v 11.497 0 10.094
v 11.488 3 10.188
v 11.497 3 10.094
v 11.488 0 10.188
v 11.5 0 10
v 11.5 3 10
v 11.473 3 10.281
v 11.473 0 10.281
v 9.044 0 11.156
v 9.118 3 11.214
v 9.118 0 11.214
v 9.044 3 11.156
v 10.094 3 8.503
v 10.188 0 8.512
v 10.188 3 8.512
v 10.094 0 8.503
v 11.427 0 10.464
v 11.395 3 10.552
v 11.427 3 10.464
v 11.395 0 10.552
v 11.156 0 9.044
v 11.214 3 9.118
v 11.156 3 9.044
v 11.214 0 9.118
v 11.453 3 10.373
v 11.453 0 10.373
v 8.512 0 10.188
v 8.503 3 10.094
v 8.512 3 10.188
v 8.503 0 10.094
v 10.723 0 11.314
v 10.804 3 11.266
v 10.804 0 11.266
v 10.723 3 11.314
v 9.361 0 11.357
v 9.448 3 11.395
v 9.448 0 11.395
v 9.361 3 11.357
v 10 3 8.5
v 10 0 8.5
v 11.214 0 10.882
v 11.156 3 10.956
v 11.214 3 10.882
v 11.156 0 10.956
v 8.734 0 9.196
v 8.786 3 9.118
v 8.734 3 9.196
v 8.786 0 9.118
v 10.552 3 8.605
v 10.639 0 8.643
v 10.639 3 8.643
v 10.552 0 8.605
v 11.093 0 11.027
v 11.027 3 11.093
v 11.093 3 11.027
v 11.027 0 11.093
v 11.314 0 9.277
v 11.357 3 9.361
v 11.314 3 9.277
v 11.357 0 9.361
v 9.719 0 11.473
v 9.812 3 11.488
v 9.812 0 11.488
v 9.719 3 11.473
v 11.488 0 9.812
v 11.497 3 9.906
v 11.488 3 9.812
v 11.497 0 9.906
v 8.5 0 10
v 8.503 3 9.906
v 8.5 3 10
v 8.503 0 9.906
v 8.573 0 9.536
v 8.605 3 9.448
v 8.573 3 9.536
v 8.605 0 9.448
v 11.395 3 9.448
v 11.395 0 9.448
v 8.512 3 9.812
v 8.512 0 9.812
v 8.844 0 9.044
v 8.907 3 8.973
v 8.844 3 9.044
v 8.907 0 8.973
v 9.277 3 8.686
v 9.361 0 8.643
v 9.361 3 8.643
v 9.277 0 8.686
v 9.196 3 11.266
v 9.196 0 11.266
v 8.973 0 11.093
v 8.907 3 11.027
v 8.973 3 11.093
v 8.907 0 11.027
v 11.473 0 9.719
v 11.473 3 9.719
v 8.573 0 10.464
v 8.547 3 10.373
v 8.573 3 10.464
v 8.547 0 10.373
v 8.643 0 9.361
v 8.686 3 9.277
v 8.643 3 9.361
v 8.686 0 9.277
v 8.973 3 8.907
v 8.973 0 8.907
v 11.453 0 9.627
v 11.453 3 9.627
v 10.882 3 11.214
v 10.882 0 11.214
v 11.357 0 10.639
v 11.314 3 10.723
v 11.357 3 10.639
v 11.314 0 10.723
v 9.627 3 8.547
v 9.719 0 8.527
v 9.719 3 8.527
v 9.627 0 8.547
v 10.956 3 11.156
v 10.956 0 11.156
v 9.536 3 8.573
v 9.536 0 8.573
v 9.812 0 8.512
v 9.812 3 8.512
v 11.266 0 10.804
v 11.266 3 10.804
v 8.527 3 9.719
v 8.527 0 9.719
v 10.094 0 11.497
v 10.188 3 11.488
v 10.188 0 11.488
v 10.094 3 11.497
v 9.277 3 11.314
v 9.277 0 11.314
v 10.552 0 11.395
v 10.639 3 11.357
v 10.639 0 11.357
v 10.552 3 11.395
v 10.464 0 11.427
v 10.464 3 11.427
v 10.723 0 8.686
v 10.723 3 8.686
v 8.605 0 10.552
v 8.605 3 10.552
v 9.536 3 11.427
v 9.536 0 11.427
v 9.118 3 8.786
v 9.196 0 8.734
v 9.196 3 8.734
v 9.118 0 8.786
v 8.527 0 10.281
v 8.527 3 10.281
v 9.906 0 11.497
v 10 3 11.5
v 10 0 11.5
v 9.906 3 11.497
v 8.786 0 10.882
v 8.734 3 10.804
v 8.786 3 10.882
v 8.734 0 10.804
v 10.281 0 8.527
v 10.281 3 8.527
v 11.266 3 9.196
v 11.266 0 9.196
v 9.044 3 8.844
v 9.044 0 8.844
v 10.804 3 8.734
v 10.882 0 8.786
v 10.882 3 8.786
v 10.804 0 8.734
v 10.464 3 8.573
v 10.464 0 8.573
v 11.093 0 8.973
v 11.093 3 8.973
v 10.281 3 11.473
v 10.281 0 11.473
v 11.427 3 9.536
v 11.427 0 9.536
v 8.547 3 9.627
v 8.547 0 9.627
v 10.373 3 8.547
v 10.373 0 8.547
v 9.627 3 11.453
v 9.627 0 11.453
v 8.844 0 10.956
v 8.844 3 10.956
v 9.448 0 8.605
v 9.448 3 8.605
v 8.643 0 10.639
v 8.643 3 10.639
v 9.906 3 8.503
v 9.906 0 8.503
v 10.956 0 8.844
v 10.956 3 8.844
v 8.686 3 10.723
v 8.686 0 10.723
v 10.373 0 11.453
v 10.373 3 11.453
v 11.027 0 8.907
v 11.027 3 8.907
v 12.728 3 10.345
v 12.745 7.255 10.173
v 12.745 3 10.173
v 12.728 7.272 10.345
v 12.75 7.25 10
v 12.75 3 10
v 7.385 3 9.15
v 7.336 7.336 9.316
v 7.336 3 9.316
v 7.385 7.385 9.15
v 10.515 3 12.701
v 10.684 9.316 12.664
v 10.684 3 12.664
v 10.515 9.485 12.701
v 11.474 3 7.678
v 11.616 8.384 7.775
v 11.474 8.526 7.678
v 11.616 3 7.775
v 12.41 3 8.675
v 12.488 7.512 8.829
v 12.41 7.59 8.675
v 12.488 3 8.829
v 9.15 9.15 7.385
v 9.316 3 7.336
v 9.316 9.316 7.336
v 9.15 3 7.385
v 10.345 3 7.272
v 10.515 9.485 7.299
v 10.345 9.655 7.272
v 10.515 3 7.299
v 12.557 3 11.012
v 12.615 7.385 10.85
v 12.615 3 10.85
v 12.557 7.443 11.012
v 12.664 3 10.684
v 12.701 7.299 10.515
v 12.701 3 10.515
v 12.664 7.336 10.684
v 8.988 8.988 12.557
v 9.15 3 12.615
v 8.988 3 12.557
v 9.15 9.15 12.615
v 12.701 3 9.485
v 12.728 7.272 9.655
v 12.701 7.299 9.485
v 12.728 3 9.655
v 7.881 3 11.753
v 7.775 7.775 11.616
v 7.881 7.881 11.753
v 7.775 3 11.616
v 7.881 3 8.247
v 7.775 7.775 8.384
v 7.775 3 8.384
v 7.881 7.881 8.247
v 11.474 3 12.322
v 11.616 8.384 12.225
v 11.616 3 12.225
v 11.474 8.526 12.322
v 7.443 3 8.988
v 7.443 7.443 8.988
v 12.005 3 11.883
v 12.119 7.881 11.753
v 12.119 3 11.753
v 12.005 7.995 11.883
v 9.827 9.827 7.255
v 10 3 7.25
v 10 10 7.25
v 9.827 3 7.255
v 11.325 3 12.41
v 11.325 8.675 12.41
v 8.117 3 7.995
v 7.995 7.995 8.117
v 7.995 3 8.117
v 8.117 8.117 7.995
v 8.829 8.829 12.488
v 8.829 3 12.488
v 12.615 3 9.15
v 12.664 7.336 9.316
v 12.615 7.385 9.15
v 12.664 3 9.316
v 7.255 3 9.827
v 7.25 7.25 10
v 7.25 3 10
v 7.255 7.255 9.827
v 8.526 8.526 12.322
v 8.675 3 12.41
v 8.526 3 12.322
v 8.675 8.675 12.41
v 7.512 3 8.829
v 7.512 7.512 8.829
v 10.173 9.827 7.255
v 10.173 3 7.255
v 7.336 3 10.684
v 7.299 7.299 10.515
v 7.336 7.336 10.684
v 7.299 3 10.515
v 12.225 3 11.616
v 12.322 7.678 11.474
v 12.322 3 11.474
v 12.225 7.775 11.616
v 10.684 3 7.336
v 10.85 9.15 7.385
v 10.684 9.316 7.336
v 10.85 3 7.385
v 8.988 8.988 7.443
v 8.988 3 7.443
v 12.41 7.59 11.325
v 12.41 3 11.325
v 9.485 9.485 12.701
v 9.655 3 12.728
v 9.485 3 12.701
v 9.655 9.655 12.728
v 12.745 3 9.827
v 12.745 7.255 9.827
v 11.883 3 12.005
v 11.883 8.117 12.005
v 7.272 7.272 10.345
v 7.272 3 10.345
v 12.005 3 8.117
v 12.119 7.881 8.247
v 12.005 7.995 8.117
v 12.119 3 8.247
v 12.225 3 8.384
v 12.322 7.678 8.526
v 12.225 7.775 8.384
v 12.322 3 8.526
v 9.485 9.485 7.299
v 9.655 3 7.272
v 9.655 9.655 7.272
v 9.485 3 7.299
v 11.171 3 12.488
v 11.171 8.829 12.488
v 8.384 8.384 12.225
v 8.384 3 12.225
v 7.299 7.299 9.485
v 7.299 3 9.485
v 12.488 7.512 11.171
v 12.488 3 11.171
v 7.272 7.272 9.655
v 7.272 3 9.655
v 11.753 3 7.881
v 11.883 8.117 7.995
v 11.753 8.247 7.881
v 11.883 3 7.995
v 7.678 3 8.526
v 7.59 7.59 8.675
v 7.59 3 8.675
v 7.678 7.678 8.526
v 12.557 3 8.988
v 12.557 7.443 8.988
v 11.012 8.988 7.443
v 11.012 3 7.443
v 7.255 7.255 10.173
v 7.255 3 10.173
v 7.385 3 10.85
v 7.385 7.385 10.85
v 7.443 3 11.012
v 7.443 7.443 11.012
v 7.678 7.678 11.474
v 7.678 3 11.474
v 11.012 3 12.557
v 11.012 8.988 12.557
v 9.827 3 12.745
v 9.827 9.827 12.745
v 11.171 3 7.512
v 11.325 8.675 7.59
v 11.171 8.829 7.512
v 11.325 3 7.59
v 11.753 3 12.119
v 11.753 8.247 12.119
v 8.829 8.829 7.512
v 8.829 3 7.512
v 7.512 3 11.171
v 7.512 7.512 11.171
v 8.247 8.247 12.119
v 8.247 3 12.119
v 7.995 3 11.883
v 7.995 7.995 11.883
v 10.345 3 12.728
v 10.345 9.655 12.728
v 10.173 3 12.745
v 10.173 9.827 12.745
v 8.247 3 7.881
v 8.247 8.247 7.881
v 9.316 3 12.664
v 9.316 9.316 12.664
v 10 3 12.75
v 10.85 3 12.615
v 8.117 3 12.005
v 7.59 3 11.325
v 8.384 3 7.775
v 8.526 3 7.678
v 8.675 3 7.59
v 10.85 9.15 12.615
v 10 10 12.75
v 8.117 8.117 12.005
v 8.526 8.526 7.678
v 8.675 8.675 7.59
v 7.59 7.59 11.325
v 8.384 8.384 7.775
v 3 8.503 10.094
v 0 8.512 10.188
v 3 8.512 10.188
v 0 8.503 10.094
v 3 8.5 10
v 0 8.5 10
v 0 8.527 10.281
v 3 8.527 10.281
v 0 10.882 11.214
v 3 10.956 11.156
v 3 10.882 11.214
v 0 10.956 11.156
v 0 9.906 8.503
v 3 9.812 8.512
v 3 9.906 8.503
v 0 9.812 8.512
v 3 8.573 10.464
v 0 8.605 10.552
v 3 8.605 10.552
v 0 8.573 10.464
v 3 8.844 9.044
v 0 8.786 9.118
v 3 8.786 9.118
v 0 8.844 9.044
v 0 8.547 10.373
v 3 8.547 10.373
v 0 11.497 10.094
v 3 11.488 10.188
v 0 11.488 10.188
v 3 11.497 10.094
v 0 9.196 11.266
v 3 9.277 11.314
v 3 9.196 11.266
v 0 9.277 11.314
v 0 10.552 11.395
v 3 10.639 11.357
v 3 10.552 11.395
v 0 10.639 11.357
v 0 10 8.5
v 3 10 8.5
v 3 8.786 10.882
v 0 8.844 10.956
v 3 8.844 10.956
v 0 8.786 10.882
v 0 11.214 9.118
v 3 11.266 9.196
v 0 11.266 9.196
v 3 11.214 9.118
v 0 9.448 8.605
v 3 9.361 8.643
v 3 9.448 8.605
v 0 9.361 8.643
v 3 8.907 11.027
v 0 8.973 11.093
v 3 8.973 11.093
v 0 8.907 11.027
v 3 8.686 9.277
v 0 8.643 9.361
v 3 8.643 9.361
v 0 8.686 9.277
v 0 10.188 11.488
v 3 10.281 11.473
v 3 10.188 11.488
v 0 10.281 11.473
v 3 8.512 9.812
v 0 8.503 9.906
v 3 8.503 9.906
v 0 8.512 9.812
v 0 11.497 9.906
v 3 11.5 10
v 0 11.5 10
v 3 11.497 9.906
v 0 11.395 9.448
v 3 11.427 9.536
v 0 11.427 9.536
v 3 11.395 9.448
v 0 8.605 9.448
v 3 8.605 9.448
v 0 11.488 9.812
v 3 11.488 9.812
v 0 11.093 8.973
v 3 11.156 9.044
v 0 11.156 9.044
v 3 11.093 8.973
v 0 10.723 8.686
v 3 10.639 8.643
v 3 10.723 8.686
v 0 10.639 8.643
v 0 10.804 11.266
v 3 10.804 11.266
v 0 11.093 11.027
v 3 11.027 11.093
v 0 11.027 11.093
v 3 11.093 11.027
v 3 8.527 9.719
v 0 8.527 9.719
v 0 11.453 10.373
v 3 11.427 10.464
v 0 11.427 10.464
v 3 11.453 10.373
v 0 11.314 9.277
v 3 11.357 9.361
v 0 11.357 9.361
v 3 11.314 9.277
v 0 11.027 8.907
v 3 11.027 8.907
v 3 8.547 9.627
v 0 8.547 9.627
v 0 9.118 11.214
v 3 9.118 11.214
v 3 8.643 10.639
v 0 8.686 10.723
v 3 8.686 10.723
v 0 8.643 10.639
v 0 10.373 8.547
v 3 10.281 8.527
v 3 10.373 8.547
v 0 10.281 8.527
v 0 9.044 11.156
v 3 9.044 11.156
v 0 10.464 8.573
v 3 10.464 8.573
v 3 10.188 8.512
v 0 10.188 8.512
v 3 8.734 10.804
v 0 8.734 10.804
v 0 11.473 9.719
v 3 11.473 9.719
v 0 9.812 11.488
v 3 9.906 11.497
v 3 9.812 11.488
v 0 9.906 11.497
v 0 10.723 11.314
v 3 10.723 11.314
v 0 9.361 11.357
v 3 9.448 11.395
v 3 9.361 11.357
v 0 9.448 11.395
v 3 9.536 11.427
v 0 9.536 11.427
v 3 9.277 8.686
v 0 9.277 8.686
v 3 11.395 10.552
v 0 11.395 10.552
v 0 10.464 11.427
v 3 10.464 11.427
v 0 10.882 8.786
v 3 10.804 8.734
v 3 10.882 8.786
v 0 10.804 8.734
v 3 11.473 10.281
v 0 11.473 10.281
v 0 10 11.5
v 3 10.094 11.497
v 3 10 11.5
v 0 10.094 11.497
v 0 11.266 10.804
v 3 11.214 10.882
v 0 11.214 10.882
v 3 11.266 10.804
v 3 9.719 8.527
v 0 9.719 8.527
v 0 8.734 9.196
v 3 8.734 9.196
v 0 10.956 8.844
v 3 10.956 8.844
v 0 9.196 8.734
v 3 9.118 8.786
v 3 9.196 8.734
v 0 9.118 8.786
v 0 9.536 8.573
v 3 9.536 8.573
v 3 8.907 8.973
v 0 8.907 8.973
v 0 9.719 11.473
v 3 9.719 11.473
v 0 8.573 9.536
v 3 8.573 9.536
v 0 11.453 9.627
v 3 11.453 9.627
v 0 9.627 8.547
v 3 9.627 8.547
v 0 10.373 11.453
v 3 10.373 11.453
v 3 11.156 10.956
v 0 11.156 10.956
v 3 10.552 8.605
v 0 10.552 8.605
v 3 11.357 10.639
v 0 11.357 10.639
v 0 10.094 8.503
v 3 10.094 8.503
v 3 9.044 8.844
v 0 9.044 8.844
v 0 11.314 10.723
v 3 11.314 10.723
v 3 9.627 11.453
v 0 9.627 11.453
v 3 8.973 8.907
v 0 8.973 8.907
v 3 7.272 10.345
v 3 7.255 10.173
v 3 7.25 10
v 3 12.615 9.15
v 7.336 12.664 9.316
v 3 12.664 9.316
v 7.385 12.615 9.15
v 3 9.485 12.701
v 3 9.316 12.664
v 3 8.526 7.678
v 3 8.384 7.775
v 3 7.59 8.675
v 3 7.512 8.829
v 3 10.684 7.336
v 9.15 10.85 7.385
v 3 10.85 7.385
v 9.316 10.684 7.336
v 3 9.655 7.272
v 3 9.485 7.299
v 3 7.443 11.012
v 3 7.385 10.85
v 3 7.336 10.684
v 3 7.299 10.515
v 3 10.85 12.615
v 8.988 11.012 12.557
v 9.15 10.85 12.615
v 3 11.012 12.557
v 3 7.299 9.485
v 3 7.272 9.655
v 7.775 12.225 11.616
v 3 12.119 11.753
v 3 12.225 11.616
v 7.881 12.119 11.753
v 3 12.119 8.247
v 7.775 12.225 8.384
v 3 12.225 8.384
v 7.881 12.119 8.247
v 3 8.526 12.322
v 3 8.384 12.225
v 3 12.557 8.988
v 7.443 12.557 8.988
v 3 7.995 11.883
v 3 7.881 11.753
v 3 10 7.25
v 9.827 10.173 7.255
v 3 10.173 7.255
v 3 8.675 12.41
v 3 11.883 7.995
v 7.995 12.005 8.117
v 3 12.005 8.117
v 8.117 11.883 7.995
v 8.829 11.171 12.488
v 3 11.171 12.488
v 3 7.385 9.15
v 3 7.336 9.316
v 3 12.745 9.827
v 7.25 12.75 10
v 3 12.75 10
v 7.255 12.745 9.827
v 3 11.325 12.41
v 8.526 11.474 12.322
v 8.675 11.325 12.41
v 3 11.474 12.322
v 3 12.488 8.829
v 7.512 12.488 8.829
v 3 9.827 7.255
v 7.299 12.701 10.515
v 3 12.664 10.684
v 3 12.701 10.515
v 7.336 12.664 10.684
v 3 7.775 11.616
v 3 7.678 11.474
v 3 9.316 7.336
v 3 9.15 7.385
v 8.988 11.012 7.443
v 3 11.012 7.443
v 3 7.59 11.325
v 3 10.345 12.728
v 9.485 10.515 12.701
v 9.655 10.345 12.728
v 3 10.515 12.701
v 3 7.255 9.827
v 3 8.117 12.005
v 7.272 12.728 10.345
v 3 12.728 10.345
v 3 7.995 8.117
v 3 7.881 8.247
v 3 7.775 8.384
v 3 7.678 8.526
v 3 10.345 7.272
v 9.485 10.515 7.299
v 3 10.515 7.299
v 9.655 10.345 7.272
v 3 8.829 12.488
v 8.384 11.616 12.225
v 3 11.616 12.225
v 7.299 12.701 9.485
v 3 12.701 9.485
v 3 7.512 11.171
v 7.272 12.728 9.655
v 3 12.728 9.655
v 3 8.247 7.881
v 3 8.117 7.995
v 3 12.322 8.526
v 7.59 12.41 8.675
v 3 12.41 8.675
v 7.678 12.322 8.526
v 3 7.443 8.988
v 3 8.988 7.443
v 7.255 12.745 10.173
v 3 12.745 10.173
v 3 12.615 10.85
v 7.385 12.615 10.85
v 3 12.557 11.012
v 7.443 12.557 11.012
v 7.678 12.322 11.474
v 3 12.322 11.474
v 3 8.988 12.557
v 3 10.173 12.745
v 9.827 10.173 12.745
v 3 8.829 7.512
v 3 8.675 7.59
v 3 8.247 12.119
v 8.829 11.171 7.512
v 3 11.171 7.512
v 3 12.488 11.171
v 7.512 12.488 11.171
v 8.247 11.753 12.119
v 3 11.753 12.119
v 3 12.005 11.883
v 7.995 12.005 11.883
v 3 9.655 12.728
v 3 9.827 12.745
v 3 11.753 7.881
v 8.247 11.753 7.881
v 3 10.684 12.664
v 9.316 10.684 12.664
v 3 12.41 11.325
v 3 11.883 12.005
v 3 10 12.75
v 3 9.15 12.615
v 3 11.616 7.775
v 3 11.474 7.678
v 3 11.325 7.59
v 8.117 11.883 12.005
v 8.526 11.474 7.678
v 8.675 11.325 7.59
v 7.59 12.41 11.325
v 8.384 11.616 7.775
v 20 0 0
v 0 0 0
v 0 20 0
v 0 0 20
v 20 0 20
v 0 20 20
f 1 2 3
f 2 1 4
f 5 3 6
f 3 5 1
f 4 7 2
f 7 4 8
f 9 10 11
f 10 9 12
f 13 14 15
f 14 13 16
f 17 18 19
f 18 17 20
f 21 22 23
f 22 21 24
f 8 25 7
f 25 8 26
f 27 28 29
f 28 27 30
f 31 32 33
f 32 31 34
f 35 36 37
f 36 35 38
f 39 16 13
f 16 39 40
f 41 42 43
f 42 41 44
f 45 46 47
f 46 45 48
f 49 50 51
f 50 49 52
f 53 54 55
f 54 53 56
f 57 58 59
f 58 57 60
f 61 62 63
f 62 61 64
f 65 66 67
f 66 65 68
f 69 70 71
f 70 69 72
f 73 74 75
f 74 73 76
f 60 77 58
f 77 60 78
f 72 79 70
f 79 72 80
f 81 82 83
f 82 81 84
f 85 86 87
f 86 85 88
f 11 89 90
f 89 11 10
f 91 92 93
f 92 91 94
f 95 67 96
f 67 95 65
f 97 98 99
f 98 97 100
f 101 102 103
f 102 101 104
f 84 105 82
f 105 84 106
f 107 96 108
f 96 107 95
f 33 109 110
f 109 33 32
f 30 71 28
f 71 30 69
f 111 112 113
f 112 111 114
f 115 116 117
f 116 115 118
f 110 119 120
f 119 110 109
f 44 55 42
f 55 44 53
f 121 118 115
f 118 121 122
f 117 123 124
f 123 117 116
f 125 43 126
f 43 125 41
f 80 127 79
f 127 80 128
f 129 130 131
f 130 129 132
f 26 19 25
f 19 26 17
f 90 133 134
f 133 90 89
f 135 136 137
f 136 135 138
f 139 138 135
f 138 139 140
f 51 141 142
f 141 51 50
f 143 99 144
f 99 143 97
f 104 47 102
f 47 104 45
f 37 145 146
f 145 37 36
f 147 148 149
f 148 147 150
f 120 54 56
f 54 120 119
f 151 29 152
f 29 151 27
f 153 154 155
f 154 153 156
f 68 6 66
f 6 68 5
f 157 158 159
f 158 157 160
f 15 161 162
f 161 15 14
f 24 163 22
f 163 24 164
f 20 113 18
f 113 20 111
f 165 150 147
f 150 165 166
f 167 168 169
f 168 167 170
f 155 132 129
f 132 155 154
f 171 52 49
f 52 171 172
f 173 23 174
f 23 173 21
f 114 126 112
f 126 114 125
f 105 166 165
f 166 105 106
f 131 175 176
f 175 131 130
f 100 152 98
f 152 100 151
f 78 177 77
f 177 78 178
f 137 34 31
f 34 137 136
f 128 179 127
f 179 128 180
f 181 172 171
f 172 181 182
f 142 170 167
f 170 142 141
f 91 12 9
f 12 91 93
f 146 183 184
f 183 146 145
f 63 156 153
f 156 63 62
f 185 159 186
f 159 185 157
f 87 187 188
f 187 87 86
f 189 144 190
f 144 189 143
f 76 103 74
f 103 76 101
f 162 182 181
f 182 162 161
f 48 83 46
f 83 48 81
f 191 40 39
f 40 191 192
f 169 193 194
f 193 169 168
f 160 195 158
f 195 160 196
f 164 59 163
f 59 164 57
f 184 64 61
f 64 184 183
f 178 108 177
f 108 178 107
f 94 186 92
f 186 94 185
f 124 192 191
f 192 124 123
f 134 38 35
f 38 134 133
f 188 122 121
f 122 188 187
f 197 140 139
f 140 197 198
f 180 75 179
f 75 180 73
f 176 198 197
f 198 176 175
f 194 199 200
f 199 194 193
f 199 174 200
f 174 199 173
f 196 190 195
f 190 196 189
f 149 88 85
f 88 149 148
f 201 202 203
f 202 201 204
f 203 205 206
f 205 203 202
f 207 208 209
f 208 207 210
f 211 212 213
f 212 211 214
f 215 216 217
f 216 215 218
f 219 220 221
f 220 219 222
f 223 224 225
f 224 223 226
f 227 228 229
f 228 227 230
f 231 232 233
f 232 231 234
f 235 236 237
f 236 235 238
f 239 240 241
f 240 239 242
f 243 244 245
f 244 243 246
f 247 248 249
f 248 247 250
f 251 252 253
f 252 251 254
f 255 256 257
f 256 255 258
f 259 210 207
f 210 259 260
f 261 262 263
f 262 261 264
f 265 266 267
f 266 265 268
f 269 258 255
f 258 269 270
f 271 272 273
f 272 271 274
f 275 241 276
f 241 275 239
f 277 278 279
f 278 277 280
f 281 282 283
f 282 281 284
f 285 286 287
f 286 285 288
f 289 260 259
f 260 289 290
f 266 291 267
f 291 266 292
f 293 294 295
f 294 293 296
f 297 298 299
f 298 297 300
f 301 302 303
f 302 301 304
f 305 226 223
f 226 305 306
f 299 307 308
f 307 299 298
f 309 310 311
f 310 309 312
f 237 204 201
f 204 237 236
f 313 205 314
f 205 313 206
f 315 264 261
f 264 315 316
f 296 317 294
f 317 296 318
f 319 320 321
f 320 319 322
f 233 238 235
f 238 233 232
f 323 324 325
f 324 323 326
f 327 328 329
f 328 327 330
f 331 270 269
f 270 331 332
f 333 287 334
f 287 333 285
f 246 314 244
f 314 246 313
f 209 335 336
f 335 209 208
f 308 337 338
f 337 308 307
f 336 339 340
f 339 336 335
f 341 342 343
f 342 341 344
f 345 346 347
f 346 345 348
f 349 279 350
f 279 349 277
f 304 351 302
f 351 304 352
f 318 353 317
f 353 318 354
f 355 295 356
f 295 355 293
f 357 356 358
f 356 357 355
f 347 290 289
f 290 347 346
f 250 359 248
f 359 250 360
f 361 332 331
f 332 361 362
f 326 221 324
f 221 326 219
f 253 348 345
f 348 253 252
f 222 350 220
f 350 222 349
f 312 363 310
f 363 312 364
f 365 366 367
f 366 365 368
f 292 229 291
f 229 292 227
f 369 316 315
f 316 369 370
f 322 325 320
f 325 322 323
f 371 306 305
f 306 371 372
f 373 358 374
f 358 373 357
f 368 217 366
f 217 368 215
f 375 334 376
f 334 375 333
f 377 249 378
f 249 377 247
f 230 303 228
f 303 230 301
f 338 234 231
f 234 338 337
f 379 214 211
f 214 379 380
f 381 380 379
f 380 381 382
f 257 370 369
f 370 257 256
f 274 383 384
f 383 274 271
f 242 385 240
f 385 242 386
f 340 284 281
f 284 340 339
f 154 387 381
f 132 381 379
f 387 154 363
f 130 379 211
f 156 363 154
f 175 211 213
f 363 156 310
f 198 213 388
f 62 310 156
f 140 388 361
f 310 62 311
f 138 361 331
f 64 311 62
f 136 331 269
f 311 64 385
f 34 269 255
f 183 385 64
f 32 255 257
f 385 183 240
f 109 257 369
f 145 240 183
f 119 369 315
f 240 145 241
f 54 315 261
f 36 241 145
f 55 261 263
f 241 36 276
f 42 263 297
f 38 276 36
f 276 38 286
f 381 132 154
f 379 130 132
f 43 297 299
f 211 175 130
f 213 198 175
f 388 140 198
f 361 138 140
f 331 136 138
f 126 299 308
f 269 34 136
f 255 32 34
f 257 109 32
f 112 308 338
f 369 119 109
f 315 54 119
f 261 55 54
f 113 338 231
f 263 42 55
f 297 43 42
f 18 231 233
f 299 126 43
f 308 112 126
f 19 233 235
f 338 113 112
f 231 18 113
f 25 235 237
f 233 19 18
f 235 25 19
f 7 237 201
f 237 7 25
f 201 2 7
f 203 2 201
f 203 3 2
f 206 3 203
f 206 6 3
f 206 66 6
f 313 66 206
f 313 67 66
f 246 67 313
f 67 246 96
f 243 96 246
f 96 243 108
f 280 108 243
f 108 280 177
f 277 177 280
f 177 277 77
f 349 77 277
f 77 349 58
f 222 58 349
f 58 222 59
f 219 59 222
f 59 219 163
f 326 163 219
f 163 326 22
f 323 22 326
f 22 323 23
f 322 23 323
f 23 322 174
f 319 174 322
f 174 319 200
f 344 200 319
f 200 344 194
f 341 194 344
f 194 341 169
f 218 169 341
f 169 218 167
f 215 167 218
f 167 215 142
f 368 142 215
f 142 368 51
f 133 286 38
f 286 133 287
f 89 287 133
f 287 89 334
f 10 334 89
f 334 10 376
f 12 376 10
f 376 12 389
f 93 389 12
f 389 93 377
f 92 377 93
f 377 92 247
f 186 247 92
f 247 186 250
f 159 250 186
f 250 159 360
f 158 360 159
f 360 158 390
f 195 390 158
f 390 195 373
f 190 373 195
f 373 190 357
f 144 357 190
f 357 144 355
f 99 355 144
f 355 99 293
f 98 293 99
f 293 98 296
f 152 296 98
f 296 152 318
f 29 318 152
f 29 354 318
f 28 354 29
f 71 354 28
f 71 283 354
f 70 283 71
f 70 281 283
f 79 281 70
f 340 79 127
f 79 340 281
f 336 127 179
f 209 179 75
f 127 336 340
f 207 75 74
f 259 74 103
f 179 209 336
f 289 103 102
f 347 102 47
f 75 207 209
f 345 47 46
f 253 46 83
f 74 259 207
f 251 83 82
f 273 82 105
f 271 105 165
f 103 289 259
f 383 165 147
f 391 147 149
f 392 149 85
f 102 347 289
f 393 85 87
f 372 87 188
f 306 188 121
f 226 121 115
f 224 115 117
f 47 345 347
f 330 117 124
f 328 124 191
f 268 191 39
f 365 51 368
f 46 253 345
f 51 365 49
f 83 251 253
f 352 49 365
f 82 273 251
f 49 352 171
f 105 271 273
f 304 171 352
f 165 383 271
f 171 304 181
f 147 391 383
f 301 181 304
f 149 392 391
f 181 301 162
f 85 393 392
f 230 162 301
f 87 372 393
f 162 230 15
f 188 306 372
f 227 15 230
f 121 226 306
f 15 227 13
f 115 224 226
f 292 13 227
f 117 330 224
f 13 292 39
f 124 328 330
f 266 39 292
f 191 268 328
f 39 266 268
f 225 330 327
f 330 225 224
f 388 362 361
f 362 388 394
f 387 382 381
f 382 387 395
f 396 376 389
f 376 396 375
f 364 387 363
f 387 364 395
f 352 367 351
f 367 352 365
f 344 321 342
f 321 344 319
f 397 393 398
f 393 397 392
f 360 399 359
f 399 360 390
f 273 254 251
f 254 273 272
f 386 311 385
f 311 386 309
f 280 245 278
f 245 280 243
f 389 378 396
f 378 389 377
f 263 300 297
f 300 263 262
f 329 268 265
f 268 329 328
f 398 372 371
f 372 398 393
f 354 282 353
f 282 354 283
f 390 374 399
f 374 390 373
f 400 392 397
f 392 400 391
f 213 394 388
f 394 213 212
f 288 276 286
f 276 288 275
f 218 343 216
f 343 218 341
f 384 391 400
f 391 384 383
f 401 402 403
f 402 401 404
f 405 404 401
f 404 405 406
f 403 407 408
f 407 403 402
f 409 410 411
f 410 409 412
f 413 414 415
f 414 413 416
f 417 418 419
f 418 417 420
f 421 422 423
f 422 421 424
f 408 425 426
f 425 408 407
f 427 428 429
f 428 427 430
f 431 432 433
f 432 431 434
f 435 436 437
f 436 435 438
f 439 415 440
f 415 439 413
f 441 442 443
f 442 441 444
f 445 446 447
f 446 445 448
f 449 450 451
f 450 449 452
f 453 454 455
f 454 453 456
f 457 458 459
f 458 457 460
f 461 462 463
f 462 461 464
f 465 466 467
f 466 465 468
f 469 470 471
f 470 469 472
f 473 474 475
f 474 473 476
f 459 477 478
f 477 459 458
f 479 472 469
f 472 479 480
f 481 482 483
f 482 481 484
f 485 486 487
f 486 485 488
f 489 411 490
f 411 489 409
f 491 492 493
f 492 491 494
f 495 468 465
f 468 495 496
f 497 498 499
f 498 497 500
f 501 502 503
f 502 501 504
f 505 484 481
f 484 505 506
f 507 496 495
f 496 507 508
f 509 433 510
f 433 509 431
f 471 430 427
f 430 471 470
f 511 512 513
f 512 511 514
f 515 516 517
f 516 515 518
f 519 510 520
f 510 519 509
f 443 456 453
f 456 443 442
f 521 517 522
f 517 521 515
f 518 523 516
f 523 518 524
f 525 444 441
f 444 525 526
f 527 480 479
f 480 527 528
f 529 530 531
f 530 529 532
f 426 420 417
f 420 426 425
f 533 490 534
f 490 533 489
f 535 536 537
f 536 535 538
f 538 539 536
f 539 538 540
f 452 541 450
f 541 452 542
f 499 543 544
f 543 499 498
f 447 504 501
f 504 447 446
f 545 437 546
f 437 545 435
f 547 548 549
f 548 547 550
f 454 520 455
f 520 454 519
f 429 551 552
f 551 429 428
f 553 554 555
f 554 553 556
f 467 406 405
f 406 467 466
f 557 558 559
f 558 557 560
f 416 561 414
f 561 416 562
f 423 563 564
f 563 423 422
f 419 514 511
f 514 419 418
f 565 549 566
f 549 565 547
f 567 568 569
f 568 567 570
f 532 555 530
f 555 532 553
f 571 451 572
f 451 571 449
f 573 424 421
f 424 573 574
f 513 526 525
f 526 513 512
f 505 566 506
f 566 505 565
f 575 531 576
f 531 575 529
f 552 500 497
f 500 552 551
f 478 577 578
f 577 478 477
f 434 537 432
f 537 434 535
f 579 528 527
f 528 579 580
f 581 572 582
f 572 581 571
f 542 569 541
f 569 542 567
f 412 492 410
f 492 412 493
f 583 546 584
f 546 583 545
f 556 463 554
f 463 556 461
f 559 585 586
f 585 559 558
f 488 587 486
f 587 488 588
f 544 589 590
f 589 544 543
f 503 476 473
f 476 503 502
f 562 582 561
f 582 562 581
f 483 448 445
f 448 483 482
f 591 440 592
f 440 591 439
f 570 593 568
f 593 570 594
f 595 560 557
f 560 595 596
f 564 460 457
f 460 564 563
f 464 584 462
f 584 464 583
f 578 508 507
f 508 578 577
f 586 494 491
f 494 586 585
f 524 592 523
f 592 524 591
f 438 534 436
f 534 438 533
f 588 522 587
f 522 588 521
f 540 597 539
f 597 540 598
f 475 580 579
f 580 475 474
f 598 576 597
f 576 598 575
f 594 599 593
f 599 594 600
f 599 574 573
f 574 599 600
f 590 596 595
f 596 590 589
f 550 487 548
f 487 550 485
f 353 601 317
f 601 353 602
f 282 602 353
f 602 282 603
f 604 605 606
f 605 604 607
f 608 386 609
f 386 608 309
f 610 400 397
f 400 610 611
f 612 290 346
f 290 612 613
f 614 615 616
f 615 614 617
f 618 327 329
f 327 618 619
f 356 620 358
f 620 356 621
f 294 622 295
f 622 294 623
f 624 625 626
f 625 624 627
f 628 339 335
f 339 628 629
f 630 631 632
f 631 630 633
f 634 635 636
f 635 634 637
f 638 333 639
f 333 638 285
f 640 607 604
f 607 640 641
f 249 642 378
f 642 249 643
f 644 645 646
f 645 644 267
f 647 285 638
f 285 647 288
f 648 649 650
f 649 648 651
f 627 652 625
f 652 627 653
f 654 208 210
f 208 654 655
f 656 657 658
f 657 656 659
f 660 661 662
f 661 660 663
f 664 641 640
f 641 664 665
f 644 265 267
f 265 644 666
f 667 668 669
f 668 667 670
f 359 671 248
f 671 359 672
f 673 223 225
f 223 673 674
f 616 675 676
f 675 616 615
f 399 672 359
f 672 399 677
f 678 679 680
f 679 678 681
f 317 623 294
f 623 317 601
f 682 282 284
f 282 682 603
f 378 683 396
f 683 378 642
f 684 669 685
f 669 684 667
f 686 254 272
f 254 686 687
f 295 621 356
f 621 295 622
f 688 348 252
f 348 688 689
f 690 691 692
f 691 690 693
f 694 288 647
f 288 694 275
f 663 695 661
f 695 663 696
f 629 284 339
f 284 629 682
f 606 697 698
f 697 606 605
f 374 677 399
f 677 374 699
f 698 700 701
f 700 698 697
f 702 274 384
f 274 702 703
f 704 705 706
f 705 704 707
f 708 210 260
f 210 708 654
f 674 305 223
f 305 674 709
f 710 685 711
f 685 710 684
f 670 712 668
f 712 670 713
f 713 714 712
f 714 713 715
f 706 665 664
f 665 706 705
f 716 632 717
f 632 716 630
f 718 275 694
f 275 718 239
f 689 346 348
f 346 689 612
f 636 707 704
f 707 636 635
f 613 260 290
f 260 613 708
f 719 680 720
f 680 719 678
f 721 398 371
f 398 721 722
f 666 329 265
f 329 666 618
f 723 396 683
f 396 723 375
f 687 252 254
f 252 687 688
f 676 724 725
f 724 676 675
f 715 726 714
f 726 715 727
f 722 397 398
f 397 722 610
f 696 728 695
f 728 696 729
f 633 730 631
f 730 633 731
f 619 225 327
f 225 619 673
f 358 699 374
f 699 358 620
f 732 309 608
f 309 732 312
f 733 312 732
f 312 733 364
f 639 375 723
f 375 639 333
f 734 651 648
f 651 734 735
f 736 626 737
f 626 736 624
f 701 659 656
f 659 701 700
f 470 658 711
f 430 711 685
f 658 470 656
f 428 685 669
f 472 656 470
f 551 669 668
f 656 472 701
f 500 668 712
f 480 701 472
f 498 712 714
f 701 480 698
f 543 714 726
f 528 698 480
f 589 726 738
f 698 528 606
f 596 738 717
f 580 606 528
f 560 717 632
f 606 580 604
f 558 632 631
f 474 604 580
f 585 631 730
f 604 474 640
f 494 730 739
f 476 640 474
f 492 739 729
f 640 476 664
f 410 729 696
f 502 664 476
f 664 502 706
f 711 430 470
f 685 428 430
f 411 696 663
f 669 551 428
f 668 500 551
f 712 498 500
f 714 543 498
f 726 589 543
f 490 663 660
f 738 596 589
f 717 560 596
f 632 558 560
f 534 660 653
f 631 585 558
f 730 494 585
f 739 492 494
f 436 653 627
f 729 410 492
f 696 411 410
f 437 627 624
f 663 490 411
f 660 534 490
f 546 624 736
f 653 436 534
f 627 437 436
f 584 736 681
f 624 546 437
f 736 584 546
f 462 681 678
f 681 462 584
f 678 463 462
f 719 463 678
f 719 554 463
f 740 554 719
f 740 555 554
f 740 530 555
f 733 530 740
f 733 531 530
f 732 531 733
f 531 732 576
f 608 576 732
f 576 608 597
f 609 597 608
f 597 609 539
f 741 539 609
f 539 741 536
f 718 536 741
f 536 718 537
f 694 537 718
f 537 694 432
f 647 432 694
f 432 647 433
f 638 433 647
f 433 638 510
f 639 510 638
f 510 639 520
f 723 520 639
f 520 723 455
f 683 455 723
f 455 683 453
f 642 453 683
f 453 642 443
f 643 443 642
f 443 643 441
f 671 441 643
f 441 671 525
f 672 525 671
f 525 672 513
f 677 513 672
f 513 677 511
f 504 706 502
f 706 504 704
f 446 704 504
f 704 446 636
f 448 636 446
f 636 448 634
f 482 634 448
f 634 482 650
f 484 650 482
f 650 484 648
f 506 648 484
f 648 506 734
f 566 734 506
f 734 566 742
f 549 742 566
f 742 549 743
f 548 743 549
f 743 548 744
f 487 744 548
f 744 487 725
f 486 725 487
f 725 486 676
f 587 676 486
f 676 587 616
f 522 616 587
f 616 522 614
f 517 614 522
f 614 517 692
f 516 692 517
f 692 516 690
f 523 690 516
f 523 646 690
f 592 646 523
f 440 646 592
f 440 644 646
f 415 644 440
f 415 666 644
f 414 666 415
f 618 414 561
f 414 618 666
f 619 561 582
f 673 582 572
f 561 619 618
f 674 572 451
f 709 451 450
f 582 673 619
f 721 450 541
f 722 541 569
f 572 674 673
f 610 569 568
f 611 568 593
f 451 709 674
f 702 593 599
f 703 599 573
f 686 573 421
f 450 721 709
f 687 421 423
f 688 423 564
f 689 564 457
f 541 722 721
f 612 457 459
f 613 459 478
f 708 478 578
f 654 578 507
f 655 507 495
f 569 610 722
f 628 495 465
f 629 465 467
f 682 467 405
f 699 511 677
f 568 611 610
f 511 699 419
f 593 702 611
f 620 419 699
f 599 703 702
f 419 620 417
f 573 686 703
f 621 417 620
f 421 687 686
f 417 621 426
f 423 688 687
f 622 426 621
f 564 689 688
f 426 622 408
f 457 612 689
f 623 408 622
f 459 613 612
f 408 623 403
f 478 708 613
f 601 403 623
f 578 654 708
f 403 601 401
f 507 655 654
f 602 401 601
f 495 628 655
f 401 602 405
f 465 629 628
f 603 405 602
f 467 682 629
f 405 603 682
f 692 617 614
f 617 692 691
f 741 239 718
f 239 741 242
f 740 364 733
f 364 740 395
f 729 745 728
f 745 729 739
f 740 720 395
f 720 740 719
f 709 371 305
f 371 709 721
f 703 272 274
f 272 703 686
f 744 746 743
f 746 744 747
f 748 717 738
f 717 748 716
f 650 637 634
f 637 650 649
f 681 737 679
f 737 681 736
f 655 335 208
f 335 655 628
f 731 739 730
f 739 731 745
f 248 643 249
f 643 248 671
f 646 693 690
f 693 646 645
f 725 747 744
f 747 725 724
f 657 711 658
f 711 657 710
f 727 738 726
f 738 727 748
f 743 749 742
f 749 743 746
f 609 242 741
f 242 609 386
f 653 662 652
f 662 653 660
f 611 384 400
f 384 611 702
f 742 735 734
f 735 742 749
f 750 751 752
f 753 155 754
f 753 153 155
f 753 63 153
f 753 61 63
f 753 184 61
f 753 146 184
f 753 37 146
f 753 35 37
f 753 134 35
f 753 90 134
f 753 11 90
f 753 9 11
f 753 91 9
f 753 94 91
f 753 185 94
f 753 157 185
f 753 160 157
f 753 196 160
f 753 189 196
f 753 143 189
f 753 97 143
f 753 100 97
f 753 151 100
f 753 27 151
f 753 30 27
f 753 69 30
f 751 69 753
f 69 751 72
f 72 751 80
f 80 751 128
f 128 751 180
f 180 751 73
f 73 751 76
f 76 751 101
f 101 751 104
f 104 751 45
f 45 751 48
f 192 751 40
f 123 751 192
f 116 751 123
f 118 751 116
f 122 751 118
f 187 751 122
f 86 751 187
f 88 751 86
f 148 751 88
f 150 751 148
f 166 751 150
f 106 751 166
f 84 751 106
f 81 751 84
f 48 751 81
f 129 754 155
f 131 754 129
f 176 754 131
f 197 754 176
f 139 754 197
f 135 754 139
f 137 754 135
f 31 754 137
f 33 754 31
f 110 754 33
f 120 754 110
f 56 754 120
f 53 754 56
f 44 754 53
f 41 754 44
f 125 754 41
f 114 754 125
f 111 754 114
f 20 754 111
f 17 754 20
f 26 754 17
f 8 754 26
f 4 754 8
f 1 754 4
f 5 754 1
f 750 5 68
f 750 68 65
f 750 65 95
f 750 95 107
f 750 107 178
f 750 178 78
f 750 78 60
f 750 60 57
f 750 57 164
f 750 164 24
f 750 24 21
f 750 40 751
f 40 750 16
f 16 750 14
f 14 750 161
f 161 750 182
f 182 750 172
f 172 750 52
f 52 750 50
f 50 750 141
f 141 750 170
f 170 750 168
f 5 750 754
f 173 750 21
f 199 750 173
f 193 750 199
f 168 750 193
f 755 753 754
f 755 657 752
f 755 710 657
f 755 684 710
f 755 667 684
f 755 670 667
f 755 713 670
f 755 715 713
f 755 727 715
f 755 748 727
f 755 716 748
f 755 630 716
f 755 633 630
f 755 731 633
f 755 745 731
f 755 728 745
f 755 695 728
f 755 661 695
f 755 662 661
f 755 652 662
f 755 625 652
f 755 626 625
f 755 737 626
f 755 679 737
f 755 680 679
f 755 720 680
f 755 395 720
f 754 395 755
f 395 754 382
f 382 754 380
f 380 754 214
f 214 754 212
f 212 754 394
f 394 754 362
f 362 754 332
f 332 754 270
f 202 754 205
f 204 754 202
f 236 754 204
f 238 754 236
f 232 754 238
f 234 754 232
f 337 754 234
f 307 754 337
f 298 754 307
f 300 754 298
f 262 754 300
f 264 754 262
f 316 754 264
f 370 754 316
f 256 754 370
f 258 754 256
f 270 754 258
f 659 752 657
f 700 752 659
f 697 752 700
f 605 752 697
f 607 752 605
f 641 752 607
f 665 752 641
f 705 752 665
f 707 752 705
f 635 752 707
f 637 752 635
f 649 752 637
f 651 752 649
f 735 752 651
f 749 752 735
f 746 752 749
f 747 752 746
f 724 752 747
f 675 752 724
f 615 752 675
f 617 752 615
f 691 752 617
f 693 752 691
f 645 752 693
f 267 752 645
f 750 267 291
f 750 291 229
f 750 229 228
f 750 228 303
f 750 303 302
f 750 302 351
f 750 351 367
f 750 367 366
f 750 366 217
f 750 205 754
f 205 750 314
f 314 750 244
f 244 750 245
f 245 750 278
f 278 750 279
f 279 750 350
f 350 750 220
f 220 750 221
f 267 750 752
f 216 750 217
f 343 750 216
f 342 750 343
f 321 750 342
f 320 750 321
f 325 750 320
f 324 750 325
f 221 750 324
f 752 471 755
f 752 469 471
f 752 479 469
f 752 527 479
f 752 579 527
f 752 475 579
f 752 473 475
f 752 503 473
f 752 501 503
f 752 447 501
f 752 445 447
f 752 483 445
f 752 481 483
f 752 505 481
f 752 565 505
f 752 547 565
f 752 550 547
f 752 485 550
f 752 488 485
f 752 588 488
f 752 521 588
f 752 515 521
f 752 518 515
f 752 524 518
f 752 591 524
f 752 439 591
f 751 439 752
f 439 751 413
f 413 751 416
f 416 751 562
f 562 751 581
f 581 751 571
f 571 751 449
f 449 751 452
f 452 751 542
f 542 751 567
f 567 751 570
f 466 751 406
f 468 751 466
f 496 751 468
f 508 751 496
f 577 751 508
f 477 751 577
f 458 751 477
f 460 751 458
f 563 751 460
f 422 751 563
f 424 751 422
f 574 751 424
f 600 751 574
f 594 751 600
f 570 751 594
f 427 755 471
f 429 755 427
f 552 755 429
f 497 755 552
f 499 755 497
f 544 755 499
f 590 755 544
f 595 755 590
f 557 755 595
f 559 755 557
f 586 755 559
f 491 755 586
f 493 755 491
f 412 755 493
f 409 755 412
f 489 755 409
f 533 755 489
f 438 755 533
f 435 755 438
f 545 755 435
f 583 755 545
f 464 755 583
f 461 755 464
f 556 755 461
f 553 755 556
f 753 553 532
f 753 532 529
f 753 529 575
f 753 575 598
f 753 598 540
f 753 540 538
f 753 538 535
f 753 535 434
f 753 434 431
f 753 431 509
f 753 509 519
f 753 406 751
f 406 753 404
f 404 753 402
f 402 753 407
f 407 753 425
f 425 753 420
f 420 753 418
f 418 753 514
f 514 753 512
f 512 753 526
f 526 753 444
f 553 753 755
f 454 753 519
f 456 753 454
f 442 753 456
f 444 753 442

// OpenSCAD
s=20;
m=3;
w=3;

m_h=m*11/6;
square(100);
rotate([90,90+45,0])
!difference(){
	linear_extrude(height=s) polygon([[0,0],[0,s],[s,0]]);
	translate([s/2,s/2,s/2])
	for(i=[0,-90]) rotate([0,0,i]) rotate([90]){
		cylinder(r=m/2,h=s/2+1,$fn=100);
		cylinder(r=m_h/2,h=s/2-w,$fn=100);
	}
}
